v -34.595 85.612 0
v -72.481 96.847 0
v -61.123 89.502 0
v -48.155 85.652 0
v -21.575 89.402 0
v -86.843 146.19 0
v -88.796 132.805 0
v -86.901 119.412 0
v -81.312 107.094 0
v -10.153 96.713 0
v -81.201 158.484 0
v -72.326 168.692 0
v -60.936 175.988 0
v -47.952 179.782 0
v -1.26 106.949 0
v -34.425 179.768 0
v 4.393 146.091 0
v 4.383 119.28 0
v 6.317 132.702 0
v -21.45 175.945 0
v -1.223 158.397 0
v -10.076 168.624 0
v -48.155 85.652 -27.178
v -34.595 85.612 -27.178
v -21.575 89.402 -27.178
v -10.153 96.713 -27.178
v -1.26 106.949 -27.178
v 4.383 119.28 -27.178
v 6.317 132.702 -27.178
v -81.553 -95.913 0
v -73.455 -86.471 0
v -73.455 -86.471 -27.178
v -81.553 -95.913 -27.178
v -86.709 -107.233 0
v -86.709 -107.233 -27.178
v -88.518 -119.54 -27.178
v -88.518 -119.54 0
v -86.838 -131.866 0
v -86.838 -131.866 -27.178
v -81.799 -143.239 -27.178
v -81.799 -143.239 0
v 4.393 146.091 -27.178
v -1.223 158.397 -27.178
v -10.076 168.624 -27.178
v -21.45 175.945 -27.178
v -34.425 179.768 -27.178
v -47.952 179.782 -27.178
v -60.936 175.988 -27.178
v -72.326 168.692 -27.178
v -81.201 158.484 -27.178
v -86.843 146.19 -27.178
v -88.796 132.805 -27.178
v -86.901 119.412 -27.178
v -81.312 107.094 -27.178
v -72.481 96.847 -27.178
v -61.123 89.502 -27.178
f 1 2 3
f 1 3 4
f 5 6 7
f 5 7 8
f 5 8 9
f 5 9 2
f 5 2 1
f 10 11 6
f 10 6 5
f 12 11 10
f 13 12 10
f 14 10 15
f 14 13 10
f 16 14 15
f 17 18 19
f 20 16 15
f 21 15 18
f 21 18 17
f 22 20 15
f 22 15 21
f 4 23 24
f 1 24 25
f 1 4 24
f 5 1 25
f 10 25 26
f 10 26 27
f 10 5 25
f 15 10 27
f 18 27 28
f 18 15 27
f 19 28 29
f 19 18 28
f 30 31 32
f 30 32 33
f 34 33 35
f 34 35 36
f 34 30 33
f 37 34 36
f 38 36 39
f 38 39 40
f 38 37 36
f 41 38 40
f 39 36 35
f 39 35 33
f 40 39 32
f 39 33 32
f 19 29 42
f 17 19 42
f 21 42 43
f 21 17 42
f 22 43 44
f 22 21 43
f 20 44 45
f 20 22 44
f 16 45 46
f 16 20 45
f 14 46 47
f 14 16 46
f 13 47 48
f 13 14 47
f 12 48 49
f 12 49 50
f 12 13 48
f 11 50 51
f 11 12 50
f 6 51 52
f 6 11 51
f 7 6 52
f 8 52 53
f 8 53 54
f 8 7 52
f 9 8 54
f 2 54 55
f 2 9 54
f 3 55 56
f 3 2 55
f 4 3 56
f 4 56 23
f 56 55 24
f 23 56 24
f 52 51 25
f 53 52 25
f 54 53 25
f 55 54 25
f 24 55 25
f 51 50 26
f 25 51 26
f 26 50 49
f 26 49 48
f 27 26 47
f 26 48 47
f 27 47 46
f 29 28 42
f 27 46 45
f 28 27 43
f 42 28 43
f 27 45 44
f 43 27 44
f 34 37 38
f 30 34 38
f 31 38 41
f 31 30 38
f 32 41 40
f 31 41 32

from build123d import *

# Parameters (mm, degrees)
F1_DEPTH = 27.178


with BuildPart() as f1:
    # F0 (on Top) → F1 (new body)
    with BuildSketch(Plane.XY):
        with BuildLine():
            ThreePointArc((6.316541, 132.702157), (-72.325812, 168.691615), (-48.155493, 85.651525))
            ThreePointArc((-48.155493, 85.651525), (-10.153478, 96.712699), (6.316541, 132.702157))
        make_face()
        with BuildLine():
            ThreePointArc((-73.45526, -86.470561), (-88.047509, -113.323145), (-81.799499, -143.238983))
            Line((-81.799499, -143.238983), (-73.45526, -86.470561))
        make_face()
    extrude(amount=-F1_DEPTH)


solid = f1.part
